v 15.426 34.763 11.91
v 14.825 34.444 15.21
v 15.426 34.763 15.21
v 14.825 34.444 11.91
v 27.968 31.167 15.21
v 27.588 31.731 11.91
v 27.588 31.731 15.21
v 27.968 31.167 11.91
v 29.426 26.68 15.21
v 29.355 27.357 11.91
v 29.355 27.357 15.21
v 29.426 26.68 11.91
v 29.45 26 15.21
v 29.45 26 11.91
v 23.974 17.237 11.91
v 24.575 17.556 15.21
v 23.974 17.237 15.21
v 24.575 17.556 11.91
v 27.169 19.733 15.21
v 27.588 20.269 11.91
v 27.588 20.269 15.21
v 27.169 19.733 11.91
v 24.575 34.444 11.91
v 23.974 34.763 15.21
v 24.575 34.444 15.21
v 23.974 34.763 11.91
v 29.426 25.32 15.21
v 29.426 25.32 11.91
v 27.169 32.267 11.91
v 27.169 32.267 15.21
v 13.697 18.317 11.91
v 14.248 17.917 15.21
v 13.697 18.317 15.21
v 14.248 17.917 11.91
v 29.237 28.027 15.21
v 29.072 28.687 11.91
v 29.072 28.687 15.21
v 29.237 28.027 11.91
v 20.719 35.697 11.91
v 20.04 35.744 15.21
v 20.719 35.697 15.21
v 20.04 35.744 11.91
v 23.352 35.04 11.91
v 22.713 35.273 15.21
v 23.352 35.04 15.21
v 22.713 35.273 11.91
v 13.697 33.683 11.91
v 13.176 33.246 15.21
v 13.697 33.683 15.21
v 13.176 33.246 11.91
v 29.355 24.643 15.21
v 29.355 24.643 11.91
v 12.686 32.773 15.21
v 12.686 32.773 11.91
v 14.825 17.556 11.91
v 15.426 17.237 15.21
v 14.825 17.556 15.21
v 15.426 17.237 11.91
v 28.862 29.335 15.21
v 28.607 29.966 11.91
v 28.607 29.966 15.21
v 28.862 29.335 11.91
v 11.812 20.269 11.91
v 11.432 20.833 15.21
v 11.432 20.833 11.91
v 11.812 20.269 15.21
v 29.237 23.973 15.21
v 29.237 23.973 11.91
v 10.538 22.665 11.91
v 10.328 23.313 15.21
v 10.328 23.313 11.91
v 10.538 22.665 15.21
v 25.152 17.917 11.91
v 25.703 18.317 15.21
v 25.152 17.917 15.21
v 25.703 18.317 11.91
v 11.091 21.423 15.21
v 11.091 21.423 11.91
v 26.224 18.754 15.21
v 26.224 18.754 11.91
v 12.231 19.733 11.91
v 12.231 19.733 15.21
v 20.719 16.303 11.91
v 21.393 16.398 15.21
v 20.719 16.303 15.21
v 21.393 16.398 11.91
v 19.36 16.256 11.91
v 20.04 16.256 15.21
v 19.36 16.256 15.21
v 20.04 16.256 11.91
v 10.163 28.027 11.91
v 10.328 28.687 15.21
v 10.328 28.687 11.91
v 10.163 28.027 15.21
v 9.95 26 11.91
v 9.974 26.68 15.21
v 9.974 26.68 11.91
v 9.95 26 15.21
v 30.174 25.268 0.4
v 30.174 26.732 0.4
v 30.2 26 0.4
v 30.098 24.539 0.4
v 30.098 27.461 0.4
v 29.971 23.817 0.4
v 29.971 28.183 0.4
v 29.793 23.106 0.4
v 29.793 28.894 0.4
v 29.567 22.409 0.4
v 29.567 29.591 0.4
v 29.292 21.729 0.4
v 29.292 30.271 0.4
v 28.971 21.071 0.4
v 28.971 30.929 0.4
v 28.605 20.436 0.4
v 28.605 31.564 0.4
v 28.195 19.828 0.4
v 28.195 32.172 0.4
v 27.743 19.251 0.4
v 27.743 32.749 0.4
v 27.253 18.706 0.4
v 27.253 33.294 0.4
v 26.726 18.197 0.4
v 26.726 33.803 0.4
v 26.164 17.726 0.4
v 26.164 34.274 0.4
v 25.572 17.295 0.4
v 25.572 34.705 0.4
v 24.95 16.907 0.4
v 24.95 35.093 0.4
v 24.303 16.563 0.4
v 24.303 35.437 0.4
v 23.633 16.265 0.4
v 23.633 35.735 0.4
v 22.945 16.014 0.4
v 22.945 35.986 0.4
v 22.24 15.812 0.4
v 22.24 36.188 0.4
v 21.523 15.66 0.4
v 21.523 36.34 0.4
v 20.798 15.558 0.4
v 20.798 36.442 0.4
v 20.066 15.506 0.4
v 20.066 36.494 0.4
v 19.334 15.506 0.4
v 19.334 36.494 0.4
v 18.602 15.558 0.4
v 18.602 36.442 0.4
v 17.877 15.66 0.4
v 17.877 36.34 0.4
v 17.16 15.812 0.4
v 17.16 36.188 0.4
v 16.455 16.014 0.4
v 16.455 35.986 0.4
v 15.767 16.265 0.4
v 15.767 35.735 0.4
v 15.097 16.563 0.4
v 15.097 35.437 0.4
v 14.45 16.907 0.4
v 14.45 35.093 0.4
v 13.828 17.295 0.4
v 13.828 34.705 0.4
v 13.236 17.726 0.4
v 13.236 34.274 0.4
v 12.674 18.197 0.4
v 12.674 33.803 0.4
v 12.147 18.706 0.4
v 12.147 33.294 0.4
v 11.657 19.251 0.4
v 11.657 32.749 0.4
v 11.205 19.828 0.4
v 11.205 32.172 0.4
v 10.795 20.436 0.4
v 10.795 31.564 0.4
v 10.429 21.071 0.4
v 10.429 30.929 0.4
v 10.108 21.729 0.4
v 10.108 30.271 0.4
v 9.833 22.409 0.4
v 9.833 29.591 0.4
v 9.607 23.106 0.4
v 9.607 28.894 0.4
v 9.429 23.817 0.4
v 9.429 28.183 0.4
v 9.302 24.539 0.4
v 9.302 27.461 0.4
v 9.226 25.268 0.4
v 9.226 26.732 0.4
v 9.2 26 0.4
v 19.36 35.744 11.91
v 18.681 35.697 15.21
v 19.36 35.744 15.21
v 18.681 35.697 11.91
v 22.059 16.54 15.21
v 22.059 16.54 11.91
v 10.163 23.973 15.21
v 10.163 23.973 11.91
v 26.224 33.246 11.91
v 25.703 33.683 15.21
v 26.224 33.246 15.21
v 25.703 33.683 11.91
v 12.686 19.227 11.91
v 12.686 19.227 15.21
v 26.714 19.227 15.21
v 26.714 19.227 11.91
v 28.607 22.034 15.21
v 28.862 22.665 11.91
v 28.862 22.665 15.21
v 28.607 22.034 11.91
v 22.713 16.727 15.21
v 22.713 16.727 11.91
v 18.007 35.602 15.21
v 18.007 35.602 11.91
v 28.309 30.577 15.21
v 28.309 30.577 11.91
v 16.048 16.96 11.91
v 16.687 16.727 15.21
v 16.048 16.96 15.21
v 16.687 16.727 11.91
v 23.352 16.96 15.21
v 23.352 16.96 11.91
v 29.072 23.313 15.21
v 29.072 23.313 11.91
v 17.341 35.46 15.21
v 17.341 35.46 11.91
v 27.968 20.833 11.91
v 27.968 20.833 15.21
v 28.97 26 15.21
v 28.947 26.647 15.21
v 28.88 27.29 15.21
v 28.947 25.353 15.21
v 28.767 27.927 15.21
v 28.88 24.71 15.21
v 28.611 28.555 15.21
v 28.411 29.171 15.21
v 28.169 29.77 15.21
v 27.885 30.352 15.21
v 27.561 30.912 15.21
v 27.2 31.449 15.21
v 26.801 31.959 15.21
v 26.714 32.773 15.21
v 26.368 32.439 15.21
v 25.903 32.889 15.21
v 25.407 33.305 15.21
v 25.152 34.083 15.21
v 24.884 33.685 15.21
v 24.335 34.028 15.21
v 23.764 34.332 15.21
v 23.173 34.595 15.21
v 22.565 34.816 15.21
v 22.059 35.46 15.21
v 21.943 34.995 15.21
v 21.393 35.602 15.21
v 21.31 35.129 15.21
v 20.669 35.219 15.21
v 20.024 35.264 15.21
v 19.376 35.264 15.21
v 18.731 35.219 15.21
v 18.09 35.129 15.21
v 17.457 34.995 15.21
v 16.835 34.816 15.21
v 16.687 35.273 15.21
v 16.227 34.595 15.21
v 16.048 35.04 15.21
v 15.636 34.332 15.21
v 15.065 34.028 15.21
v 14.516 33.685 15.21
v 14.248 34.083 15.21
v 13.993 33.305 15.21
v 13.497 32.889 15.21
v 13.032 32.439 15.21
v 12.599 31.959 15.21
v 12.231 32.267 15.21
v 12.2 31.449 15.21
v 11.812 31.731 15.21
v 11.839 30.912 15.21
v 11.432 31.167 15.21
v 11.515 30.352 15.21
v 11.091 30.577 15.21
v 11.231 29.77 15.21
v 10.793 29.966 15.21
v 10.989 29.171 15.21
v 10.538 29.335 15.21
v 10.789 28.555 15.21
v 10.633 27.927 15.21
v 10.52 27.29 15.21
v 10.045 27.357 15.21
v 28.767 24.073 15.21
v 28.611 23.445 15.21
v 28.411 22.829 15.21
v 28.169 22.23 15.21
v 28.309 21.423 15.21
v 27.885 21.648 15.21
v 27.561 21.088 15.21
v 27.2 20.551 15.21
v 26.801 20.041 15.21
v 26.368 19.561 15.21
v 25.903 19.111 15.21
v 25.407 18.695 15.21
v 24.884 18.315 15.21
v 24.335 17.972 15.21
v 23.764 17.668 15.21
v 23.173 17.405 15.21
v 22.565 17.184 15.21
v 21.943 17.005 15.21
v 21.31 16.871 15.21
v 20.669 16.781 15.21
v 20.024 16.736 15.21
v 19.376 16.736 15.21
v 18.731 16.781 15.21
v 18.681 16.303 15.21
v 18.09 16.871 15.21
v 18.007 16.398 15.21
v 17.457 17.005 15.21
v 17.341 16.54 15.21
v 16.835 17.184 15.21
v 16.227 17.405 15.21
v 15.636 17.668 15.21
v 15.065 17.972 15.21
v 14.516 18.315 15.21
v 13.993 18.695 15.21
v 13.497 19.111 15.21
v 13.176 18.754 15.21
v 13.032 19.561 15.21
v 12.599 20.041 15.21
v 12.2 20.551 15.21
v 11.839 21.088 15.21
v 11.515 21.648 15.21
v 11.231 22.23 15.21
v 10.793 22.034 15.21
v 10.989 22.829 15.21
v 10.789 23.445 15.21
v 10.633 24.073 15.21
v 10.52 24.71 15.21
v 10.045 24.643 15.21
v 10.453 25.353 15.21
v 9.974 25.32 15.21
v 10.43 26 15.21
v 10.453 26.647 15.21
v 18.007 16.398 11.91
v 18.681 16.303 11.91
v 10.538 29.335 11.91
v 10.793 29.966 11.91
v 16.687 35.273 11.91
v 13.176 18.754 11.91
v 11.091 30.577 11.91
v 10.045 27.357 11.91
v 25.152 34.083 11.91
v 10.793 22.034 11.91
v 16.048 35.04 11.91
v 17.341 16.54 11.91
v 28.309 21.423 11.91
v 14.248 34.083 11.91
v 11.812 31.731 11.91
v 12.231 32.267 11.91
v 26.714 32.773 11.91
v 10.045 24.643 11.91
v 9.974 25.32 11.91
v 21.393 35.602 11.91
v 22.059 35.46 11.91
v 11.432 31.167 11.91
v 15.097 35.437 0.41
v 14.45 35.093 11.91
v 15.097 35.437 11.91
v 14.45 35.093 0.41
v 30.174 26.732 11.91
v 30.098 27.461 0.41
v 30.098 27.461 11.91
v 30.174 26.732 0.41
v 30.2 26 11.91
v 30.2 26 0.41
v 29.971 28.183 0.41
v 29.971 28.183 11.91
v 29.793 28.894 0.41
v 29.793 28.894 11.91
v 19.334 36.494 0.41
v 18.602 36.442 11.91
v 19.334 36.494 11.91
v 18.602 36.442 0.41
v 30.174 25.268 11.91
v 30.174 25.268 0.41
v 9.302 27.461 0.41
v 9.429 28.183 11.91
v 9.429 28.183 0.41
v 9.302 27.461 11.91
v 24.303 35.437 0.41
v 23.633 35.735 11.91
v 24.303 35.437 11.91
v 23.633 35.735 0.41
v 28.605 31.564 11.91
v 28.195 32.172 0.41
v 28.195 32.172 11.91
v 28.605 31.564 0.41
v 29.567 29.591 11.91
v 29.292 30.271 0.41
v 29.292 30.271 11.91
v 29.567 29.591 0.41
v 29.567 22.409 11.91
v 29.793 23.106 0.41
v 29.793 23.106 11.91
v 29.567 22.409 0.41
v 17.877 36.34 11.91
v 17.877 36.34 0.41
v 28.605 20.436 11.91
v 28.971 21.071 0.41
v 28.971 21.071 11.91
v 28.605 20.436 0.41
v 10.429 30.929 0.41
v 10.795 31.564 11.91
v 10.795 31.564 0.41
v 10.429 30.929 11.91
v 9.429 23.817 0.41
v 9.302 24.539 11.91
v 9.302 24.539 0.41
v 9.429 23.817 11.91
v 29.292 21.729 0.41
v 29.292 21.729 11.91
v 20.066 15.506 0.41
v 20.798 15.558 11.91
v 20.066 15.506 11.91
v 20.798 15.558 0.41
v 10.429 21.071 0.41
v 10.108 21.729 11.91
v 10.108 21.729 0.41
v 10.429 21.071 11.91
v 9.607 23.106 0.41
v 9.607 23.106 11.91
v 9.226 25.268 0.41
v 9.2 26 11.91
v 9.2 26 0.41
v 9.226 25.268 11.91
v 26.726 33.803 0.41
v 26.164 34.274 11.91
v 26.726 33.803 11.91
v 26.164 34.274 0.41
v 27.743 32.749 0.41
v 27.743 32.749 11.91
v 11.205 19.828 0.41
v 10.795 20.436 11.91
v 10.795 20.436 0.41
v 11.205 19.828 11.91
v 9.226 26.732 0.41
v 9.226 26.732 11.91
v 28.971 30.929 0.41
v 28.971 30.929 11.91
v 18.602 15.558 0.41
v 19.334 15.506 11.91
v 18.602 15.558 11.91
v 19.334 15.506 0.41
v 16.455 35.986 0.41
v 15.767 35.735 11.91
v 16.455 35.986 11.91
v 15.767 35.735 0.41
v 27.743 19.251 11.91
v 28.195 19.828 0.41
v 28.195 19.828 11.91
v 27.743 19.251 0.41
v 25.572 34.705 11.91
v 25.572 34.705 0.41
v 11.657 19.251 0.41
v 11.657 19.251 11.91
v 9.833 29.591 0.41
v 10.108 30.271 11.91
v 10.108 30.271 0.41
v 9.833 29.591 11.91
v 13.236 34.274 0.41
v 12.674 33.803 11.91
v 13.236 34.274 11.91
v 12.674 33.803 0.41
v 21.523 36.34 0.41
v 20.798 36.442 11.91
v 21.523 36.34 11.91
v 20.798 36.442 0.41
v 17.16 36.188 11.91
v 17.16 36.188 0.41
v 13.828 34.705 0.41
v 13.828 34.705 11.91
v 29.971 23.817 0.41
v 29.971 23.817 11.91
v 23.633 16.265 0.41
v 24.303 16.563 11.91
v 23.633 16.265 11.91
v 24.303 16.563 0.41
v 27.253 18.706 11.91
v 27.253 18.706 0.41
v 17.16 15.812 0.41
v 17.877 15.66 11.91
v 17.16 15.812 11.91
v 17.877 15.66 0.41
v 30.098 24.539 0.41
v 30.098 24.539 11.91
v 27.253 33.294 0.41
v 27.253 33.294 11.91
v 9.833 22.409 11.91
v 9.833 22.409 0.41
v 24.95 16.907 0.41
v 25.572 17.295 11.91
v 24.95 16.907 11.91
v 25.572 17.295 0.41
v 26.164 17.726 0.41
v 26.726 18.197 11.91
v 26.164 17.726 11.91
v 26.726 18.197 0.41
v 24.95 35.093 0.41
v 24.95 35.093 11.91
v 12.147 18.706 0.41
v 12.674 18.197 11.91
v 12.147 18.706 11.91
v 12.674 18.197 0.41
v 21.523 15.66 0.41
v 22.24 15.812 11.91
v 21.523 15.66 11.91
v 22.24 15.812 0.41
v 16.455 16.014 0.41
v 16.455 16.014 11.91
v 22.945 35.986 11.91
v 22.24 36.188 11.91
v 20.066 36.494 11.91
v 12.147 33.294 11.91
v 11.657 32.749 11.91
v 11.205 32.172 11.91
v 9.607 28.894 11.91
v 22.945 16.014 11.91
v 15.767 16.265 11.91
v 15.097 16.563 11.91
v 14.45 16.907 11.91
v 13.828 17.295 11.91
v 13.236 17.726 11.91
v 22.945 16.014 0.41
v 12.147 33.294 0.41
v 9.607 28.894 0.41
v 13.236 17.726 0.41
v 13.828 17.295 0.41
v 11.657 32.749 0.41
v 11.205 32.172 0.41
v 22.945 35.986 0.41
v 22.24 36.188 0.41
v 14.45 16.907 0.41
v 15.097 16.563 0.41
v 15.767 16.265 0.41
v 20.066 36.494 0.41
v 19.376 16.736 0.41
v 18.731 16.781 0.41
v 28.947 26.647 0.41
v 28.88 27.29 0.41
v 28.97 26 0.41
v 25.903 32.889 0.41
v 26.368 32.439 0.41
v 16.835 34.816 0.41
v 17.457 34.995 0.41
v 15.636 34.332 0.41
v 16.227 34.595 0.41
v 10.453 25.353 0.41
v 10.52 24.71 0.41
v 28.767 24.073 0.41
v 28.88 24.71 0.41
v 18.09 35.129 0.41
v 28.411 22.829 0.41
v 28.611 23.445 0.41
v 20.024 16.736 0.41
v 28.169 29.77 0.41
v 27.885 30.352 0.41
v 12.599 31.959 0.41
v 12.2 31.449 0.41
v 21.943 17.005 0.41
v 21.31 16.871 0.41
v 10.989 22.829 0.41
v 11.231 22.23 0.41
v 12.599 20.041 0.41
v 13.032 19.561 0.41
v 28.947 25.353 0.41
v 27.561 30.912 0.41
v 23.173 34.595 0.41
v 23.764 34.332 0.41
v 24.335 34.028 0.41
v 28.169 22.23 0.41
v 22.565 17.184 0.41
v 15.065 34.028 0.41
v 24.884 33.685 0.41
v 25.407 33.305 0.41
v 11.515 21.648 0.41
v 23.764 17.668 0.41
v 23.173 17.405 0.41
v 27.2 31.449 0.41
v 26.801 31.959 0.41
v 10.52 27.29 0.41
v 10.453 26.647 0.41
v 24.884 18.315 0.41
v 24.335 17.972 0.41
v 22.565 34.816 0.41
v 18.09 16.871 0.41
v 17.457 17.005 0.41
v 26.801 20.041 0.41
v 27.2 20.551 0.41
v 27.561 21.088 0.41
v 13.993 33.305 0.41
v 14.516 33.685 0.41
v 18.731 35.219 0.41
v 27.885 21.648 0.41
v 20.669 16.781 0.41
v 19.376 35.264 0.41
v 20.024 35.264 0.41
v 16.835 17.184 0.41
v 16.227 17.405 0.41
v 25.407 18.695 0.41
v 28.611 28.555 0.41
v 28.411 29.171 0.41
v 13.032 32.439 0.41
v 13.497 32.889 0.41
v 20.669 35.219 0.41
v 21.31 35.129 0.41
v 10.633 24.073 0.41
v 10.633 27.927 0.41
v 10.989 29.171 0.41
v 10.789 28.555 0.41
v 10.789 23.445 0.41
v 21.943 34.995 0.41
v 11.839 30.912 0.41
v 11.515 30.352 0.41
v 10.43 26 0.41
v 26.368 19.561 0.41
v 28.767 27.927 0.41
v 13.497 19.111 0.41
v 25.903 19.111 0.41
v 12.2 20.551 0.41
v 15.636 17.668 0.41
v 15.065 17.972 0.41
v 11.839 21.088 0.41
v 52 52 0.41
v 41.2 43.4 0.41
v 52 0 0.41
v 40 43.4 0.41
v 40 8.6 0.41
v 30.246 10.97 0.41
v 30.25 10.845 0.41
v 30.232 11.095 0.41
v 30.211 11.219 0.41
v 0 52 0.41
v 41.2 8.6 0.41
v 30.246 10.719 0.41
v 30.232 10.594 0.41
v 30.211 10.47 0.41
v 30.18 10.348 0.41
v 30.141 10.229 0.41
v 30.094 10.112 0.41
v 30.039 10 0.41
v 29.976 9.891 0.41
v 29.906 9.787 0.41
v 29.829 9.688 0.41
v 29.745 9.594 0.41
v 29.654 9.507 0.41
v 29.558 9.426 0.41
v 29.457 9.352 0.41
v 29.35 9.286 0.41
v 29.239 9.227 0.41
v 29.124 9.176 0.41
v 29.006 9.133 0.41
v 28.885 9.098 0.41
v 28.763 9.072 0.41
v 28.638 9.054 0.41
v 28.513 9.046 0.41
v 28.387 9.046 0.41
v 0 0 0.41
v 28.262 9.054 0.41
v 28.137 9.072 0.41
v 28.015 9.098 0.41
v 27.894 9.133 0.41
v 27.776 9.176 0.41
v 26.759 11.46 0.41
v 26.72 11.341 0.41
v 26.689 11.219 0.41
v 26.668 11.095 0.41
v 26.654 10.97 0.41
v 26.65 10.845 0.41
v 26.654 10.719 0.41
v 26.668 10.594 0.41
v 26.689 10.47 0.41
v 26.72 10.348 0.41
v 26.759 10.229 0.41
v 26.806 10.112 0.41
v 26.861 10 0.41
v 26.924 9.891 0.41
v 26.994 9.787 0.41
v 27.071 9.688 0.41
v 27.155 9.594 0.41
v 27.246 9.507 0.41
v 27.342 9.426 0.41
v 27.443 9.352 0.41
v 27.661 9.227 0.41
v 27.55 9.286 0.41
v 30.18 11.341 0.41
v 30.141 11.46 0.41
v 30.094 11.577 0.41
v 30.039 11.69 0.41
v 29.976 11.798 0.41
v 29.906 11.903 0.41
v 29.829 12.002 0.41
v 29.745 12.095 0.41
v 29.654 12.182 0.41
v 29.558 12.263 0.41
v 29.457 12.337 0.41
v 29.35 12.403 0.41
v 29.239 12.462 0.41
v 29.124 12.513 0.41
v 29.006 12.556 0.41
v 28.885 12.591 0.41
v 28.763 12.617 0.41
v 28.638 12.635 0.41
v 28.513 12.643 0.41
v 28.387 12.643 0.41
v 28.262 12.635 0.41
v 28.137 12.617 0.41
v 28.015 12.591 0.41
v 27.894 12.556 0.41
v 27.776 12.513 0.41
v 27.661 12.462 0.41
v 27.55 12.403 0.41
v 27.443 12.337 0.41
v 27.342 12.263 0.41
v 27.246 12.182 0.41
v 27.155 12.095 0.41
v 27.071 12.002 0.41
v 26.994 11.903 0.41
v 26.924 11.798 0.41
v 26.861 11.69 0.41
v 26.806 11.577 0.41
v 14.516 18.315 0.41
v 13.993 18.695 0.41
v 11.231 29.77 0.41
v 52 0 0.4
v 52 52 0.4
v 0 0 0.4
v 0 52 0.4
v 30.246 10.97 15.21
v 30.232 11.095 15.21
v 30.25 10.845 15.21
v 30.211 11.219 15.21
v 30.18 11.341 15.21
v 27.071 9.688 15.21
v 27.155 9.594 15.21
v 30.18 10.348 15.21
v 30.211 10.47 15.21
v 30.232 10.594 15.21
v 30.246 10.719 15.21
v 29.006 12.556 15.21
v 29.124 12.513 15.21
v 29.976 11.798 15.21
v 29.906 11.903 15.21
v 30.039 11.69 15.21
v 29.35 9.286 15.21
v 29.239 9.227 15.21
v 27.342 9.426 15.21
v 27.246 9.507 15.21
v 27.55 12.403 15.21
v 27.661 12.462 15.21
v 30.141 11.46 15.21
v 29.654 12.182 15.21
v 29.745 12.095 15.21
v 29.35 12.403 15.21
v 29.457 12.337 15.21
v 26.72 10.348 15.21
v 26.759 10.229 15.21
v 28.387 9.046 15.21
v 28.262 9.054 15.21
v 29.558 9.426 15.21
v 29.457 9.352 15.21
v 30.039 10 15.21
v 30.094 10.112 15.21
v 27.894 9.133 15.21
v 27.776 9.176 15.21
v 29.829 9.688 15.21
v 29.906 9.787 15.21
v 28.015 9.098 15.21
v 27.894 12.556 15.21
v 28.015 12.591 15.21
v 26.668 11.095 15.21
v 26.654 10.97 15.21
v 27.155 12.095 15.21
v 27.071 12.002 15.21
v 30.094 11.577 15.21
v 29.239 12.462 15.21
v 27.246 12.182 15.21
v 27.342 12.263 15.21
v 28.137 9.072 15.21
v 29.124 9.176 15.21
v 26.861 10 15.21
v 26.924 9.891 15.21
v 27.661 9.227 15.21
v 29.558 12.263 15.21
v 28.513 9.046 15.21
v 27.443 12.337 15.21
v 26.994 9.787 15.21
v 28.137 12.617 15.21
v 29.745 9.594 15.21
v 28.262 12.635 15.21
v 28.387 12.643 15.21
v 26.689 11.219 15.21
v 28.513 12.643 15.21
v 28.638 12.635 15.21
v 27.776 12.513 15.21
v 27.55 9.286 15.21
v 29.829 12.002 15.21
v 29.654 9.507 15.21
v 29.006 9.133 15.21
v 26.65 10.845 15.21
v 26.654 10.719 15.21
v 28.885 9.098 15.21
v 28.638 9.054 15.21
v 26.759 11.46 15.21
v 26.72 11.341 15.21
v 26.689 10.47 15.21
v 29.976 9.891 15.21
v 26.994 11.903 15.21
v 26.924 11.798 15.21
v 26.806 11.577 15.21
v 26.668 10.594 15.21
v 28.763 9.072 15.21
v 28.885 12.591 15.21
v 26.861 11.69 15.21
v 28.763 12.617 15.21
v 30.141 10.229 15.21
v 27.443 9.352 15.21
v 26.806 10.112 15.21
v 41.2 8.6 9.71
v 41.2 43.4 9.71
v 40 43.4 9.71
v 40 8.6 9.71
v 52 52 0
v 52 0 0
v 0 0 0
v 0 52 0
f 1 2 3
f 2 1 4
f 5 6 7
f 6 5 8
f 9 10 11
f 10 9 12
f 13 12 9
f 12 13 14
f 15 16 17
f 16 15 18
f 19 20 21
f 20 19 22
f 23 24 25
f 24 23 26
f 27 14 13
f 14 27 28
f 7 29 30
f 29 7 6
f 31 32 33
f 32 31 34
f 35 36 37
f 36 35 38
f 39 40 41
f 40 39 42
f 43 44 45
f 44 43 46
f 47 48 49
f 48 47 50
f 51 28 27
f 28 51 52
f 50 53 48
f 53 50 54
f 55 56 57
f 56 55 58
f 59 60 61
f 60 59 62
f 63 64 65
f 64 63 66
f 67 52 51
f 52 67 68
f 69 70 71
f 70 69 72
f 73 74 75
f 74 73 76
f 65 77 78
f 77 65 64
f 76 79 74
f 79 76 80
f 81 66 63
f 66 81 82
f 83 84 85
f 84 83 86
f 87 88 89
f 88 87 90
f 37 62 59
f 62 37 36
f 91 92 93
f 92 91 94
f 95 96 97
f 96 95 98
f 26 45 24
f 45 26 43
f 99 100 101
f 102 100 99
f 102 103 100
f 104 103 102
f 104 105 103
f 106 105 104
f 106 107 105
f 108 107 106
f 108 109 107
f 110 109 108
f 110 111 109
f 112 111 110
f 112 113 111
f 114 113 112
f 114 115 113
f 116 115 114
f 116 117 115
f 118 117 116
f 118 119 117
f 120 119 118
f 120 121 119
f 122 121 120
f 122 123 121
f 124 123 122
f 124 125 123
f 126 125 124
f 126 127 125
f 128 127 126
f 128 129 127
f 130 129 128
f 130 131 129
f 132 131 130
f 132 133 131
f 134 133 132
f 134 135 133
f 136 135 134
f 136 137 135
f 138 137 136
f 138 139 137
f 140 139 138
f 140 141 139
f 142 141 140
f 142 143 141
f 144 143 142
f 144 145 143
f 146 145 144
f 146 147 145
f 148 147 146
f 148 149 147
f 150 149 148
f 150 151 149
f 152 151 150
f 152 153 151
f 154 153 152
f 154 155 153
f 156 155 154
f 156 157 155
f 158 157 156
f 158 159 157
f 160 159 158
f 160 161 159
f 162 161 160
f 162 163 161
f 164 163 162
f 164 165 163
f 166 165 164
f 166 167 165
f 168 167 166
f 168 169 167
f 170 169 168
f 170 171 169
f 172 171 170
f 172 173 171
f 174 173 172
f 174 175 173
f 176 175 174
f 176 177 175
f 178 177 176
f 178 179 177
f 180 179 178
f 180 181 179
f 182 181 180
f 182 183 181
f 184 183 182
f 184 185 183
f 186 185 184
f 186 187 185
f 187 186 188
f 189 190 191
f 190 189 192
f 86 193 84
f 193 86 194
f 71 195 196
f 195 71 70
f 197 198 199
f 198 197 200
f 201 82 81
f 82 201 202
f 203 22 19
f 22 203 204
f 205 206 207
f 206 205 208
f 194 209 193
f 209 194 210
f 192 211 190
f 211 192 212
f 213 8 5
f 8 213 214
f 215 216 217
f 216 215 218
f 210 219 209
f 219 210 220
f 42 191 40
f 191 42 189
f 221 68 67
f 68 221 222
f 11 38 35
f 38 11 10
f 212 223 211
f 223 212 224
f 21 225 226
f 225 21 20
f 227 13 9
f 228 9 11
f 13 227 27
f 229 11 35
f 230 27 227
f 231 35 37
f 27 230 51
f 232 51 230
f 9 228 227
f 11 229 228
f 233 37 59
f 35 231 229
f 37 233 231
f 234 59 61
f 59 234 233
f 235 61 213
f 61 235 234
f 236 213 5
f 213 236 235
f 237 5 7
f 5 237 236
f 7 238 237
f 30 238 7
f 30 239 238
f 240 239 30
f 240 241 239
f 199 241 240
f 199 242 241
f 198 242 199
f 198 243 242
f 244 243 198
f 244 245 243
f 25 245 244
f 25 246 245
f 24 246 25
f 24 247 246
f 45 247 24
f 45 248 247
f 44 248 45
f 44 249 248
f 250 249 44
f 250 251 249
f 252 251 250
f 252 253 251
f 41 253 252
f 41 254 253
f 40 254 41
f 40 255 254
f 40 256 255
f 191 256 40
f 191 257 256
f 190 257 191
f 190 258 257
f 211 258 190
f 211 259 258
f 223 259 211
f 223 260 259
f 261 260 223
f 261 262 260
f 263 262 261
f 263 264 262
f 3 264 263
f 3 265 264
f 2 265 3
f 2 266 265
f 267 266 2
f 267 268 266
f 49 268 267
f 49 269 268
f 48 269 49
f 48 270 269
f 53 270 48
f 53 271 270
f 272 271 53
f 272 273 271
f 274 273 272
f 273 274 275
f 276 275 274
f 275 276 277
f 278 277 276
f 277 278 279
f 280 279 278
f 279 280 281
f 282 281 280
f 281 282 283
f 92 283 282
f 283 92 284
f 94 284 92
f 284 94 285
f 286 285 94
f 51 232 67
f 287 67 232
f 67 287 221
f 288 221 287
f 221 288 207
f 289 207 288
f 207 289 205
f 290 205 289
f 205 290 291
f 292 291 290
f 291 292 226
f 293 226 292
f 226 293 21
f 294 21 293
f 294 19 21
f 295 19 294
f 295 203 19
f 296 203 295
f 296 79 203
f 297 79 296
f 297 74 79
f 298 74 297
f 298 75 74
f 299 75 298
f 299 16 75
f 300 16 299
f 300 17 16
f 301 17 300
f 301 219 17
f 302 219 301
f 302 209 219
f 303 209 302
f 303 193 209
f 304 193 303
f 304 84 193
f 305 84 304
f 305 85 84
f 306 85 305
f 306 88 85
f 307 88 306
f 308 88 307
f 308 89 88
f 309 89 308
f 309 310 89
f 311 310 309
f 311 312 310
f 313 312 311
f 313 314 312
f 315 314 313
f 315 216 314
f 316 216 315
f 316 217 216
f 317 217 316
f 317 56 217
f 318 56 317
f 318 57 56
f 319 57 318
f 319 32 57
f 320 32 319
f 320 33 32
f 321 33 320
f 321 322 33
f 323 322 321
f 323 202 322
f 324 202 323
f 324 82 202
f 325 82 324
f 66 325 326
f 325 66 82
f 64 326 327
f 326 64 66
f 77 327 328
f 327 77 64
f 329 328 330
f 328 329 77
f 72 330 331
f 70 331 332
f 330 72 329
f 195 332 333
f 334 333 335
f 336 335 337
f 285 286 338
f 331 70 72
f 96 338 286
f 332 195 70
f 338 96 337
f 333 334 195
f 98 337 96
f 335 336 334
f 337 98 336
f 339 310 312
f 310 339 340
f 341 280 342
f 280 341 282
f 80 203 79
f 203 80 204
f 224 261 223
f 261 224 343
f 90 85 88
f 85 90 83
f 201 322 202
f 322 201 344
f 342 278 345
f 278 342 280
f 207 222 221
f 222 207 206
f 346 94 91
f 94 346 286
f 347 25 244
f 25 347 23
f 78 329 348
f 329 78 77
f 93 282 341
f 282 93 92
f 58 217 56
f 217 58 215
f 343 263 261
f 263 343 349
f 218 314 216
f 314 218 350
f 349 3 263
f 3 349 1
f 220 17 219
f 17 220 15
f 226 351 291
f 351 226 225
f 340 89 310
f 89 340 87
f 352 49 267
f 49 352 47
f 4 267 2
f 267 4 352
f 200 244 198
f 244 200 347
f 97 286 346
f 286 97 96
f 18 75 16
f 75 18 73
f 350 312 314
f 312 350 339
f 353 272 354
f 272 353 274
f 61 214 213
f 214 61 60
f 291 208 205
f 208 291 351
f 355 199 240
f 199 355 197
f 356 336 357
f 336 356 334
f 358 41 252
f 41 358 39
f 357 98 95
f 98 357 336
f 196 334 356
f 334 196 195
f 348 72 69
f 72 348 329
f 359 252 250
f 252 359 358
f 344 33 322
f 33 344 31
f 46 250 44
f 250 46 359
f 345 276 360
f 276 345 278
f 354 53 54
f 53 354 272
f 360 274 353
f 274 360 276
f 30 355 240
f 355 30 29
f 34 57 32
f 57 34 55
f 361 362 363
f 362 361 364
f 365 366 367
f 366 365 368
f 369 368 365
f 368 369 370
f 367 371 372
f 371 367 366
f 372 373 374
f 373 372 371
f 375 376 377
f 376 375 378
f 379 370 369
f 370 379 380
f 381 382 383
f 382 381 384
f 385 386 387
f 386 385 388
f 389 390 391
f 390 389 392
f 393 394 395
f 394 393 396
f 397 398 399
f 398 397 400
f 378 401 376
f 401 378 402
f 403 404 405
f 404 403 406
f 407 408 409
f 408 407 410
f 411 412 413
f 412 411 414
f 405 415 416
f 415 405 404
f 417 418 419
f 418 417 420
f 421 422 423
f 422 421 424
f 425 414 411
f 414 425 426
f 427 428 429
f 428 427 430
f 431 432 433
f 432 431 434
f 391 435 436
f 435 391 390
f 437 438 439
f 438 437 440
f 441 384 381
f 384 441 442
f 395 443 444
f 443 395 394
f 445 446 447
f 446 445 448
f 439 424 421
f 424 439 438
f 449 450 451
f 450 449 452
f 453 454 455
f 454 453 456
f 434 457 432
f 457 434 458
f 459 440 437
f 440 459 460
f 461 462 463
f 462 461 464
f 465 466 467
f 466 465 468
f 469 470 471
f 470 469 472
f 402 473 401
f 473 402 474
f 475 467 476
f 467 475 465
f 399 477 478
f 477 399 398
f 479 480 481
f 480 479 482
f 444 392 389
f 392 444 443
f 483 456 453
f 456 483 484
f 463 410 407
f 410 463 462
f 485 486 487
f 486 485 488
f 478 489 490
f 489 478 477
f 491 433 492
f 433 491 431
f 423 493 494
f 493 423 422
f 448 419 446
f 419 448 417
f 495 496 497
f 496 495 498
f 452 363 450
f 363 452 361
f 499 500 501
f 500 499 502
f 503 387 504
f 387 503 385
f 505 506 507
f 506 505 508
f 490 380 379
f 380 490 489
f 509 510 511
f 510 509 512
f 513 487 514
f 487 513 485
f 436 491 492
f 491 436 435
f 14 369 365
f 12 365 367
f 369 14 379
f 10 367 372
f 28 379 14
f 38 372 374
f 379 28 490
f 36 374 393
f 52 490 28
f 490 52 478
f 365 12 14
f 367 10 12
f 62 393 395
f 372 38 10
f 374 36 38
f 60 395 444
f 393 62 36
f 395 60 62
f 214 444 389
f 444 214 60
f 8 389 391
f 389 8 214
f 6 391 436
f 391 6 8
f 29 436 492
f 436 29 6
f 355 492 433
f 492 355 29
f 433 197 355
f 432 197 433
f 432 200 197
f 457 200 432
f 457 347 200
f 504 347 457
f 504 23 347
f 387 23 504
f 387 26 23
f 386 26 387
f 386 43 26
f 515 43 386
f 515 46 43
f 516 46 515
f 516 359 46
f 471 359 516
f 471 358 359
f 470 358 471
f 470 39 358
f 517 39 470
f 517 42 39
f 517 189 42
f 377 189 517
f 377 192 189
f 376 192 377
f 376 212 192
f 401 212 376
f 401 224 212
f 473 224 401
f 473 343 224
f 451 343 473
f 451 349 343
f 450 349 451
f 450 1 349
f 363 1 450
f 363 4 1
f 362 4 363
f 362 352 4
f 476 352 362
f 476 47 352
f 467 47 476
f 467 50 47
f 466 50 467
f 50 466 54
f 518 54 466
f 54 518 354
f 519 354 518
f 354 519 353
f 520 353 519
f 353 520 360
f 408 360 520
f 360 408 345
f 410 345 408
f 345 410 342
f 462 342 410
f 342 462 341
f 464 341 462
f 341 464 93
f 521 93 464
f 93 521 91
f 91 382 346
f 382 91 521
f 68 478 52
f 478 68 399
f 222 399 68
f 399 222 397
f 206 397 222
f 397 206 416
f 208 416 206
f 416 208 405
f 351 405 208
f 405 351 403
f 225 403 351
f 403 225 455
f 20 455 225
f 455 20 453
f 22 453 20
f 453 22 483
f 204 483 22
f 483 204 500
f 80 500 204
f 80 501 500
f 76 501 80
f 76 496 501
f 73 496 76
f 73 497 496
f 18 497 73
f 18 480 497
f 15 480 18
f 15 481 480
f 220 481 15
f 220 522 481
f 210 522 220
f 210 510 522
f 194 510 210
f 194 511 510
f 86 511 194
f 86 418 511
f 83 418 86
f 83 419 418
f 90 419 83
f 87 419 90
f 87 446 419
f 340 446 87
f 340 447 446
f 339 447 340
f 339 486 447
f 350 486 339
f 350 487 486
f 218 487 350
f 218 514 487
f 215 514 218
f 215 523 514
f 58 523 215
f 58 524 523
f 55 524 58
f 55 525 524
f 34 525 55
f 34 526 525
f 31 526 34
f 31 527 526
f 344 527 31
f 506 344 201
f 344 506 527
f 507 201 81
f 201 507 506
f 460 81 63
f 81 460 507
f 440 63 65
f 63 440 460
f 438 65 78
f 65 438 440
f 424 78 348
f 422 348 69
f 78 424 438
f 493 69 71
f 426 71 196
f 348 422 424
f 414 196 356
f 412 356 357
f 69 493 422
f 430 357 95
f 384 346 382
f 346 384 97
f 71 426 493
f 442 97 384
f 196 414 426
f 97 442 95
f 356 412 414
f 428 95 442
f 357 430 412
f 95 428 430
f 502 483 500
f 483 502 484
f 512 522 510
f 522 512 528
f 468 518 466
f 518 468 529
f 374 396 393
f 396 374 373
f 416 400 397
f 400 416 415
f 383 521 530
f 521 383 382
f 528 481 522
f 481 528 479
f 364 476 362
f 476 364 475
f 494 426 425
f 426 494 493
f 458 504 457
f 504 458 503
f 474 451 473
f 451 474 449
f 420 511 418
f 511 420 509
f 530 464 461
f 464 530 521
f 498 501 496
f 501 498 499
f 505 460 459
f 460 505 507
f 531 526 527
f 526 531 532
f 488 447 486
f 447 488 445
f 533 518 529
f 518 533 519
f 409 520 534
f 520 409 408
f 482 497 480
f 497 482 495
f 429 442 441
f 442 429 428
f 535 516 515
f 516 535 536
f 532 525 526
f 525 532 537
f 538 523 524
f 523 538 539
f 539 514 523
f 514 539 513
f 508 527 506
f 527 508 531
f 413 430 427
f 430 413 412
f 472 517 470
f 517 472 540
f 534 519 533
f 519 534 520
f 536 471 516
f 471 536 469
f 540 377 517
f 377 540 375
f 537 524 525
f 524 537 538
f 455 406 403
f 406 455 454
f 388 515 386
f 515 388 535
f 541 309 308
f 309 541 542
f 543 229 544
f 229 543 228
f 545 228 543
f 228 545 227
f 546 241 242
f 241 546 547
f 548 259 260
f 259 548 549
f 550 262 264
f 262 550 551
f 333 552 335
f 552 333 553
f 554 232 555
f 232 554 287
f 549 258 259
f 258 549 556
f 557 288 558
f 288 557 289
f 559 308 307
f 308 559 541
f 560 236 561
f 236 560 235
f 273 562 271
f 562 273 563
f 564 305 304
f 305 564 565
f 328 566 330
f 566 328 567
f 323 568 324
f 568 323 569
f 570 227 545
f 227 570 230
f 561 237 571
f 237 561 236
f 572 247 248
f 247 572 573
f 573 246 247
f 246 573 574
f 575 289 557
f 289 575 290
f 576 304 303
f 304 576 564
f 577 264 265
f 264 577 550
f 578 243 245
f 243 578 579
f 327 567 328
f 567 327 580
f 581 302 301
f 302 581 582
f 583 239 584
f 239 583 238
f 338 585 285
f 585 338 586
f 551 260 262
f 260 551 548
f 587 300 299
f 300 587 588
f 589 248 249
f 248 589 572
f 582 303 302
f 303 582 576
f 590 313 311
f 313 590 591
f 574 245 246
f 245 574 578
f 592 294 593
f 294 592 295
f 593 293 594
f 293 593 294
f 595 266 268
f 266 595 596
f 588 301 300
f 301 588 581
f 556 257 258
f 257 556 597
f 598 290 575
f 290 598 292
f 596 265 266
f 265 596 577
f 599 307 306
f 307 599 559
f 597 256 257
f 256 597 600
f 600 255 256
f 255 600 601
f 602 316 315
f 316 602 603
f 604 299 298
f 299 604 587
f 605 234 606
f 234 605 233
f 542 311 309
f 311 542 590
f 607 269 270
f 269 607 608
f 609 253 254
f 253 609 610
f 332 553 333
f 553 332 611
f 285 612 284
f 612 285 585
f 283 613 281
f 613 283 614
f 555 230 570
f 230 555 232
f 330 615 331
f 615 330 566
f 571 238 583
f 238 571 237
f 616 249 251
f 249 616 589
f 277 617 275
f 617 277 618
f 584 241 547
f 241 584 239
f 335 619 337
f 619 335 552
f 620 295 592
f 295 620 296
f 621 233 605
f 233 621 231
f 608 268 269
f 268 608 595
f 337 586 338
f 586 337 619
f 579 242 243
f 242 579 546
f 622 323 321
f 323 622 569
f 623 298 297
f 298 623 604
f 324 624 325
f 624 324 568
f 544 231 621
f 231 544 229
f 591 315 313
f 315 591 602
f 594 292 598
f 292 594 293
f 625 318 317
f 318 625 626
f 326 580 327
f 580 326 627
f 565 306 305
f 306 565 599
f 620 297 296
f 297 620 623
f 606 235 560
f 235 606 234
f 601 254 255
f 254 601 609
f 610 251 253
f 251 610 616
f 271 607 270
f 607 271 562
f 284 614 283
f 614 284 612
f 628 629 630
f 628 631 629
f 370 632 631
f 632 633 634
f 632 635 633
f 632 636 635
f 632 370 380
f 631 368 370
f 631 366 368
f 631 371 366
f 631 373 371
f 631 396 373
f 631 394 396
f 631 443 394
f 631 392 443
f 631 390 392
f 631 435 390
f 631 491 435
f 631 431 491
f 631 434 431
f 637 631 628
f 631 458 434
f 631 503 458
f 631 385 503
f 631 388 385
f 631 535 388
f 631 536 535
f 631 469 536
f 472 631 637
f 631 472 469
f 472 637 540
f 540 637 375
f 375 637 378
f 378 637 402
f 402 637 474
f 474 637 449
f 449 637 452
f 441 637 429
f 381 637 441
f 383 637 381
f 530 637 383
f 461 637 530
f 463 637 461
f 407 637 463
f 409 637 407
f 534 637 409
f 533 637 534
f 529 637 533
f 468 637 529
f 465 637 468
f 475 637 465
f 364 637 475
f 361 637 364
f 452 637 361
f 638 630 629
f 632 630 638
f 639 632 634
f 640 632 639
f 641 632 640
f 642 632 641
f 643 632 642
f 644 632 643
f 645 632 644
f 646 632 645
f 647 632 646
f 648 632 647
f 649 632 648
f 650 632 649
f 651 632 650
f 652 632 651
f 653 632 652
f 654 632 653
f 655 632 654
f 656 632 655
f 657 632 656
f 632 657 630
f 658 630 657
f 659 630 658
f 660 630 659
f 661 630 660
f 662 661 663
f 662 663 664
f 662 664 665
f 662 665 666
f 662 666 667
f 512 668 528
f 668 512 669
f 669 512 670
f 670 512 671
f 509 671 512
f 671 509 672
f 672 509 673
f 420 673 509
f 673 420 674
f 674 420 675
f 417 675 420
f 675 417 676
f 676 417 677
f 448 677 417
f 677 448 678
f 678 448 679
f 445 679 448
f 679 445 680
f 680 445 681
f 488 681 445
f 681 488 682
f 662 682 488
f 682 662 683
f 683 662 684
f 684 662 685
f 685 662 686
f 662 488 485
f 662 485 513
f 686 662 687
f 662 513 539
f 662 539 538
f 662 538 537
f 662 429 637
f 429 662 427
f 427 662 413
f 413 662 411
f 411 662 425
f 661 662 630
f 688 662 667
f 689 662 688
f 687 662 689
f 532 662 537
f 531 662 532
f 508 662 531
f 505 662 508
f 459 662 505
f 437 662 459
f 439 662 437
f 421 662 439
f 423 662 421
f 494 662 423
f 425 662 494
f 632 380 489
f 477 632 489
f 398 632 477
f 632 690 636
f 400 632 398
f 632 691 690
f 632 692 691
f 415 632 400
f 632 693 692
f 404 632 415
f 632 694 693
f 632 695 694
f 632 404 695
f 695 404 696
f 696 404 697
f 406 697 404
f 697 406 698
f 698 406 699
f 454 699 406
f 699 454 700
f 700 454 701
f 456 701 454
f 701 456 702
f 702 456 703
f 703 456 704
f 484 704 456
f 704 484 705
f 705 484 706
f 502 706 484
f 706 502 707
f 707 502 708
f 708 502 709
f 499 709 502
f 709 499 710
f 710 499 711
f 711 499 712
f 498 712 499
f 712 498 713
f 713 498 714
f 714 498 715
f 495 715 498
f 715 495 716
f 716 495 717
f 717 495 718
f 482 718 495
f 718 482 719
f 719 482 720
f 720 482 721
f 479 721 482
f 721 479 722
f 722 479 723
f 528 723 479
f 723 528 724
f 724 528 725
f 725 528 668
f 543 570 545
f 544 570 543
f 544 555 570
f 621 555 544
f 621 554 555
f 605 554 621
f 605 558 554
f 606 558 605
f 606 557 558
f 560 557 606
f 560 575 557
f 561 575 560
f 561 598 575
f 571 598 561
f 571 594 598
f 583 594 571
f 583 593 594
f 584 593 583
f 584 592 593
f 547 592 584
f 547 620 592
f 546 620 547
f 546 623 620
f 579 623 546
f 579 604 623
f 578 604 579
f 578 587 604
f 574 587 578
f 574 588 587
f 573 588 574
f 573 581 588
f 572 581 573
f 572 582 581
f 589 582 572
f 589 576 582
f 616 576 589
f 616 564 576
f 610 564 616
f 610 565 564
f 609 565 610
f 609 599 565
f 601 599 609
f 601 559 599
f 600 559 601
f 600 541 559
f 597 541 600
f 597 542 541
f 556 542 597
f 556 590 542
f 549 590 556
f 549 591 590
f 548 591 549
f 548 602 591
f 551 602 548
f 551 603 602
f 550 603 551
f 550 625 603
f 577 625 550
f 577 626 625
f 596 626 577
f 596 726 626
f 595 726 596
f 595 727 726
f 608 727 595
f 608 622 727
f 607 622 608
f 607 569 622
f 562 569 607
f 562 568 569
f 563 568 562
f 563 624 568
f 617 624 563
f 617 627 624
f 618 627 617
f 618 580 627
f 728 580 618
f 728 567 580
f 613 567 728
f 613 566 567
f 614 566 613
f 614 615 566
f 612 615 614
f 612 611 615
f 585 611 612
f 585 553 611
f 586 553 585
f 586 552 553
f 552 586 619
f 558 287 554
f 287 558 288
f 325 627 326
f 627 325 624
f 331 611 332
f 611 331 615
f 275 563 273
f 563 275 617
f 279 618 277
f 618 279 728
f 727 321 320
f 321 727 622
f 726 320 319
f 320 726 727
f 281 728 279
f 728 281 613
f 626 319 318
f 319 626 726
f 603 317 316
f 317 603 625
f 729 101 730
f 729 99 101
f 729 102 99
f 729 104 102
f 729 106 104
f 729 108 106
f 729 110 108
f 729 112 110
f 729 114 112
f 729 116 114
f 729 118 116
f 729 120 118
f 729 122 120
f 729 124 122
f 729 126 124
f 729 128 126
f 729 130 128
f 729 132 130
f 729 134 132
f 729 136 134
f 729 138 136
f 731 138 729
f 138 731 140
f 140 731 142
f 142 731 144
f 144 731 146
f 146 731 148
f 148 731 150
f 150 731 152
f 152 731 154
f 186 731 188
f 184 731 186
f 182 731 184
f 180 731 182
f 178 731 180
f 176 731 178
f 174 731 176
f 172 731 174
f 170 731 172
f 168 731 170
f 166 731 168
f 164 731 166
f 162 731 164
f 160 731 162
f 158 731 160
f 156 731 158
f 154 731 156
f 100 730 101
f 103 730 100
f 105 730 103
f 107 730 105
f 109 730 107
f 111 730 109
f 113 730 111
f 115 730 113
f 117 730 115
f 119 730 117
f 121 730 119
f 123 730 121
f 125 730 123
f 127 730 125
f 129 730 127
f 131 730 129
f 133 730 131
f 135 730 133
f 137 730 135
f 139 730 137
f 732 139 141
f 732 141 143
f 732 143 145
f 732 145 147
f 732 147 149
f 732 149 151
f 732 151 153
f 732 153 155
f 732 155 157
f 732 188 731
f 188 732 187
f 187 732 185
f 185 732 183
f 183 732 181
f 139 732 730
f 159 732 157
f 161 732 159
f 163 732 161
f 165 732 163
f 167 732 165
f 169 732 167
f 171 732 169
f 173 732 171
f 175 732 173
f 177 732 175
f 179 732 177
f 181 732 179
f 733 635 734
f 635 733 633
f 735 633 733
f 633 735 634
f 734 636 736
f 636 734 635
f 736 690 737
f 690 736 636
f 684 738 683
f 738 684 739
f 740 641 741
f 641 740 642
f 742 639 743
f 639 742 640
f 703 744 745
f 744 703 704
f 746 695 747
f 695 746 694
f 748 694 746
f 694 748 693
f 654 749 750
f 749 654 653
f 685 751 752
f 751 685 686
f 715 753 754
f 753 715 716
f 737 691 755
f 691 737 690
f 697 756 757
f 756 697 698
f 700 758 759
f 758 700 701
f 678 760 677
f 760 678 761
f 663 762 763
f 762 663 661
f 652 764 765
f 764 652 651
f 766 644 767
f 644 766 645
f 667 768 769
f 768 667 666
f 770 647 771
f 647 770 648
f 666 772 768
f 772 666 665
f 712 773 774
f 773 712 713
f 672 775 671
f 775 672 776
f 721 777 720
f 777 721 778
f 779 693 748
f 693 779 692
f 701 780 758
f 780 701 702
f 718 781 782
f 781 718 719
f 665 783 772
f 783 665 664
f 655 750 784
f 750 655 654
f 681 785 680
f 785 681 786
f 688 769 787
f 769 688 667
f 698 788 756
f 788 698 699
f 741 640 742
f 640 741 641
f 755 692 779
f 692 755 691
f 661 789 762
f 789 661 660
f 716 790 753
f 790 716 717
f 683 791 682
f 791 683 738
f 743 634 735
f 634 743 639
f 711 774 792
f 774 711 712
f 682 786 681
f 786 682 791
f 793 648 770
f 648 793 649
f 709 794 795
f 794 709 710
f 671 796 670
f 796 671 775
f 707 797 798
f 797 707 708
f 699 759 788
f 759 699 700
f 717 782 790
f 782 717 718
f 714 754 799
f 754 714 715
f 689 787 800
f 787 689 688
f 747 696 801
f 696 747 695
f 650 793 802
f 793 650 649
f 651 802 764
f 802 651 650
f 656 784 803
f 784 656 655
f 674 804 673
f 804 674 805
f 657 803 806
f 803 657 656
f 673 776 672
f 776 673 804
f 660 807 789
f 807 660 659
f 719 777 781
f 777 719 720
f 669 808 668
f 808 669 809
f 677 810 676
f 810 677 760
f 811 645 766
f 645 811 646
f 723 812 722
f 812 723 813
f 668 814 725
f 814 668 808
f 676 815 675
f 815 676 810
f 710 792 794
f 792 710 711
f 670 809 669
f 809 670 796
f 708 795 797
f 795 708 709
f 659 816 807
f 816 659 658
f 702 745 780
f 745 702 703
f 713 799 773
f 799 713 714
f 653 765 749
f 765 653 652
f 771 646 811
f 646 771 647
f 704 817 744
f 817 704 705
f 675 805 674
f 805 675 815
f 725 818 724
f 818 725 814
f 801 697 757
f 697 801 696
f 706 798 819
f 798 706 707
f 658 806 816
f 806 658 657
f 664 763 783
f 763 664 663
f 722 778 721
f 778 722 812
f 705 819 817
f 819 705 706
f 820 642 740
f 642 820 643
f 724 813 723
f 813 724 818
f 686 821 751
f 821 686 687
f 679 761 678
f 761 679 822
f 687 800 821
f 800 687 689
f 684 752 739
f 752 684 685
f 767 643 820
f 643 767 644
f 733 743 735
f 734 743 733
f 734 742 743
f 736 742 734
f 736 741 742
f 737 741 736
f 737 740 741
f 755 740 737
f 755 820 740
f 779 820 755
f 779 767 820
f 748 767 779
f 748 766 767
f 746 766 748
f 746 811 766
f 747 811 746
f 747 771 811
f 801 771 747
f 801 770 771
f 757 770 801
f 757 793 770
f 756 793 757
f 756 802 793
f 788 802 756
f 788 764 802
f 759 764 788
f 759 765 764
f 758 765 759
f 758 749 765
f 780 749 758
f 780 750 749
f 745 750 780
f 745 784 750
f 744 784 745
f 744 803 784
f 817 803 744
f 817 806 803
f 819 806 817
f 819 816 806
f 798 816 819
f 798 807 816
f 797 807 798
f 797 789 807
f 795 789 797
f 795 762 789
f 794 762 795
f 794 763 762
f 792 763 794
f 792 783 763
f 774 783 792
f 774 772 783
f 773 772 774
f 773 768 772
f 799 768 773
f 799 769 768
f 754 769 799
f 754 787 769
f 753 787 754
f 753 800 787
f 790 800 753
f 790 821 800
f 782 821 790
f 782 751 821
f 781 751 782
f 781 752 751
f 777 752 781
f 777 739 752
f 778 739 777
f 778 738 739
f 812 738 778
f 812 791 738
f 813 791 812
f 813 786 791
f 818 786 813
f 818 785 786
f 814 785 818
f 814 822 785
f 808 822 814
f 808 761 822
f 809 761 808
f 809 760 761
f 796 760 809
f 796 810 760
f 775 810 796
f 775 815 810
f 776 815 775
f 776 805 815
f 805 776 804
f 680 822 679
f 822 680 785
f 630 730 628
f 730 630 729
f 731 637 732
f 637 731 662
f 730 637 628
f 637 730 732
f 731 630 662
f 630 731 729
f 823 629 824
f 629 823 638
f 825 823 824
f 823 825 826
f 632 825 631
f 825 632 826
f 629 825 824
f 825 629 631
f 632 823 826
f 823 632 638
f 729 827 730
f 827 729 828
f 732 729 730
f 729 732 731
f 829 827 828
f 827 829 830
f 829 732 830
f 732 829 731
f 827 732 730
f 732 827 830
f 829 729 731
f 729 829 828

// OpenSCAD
// file: ../../Base/PlacementOptions.scad
// Fischertechnik Box Foundation
// Placement Options

// Alignment
NoAlign = 0;
AlignLeft = 1;
AlignBottom = 2;
AlignCenter = 3;
AlignRight = 4;
AlignTop = 5;

// Element rotation degree steps
rotations = [0, -90, -180, -270];

// Rotation
NoRotation = 0;
Rotate0 = 0;
Rotate90 = 1;
Rotate180 = 2;
Rotate270 = 3;

// Docking (seen from above)
NoDock = -1;
DockLeft = 0;
DockTop = 1;
DockRight = 2;
DockCorner = 2;
DockBottom = 3;

// Web corners
LowerLeft = 0;
UpperLeft = 1;
UpperRight = 2;
LowerRight = 3;

// Web position relative to corner
LeftOfCorner = 0;
RightOfCorner = 1;
// file: ../../Base/Boxes.scad
// Fischertechnik Box Foundation
// Pre-designed Boxes

use <Constants.scad>

include <PlacementOptions.scad>

box190Width = 190;
box190Depth = 130;
box130Width = 130;
box130Depth = 95;
boxUsageHeight = 33.9;
boxWallThickness = 2.4;
boxBaseThickness = 1.0;
boxWebWidth = 3.0;

// getBoxWallThickness()
// Gets the wall thickness of a Fischertechnik Box

function getBoxWallThickness() = boxWallThickness;

// Gets the usable height of a fischertechnik box
function getBoxUsageHeight() = boxUsageHeight;

// Gets the thickness of the Fischertechnik box base.
function getBoxBaseThickness() = boxBaseThickness;

// Gets the width of a box web
function getBoxWebWidth() = boxWebWidth;

// Gets the usable inner space of a Box 190 as an x/y-list
function getBox190Space() = [
    box190Width - 2*getBoxWallThickness(), 
    box190Depth - 2*getBoxWallThickness() ];

// Imports the Fischertechnik empty box 130x190 mm and places it at position 0,0
// 190x130 are the outer sizes, the inner space is slightly smaller. Use getBox190Space() to get the inner sizes.
// This module needs the STL file "Fischertechnik Box 130x190.stl" in the library path.
// The box is positioned that the usable inner space is at the 0,0,0 position. The

module Box190() {
    translate([-getBoxWallThickness(),-getBoxWallThickness(),-getBoxBaseThickness()])
        import("Fischertechnik Box 130x190.stl", convexity=3);
}

// Gets the usable inner space of a Box 130 as an x/y-list
function getBox130Space() = [
    box130Width - 2*getBoxWallThickness(), 
    box130Depth - 2*getBoxWallThickness() ];

// Imports the Fischertechnik empty box 95x130 mm and places it at position 0,0
// 190x130 are the outer sizes, the inner space is slightly smaller. Use getBox190Space() to get the inner sizes.
// This module needs the STL file "Fischertechnik Box 95x130.stl" in the library path.
// The box is positioned that the usable inner space is at the 0,0,0 position. The

module Box130() {
    translate([-getBoxWallThickness(),-getBoxWallThickness(),-getBoxBaseThickness()])
        import("Fischertechnik Box 95x130.stl", convexity=3);
}

// Creates a web at the specified box walls
// corner 0 = LowerLeft, 1 = UpperLeft, 2 = UpperRight, 3 = LowerRight
// side 0 = LeftOfCorner, 1 = RightOfCorner
// distance = Distance in mm from the corner
// box = inner width and depth of the box (default: Box 190)
// webWidth = length of the web (default is 3 mms)
// webThickness = thickness of the web (default is 1 mm)

module BoxWeb(corner, side, distance, box=getBox190Space(), webWidth=getBoxWebWidth(), webThickness=1.0) {
    sink = getBoxWallThickness()/2;

    width = (corner % 2 == 0) ? 
            (side == LeftOfCorner ? webWidth : webThickness) :
            (side == LeftOfCorner ? webThickness : webWidth);

    depth = (corner % 2 == 0) ? 
            (side == RightOfCorner ? webWidth : webThickness) :
            (side == RightOfCorner ? webThickness : webWidth);
    
    xDiff = corner == LowerLeft ? 
                (side == LeftOfCorner ? -sink : distance) :
            (corner == UpperLeft ?                
                (side == LeftOfCorner ? distance : -sink) :
            (corner == UpperRight ?
                (side == LeftOfCorner ? box.x-webWidth+sink : box.x-distance-webThickness) :
                (side == LeftOfCorner ? box.x-distance-webThickness: box.x-webWidth+sink)));

    yDiff = corner == LowerLeft ? 
                (side == RightOfCorner ? -sink : distance) :
            (corner == UpperLeft ?
                (side == RightOfCorner ? box.y-distance : box.y-webWidth+sink) :
            (corner == UpperRight ?
                (side == RightOfCorner ? box.y-webWidth+sink : box.y-distance) :
                (side == RightOfCorner ? distance : -sink)));
    
    translate([xDiff, yDiff, -getExcess()])
        cube([width, depth, boxUsageHeight + 2*getExcess()]);
}
// file: ../../Base/Rotation.scad
// Fischertechnik Box Foundation
// Geometry Helpers Rotation

include <PlacementOptions.scad>

// getRotatedSpace(space, rotation=NoRotation)
// Rotates the space dependent on the specified rotation

function getRotatedSpace(space, rotation=NoRotation) = [
    (rotation == Rotate90 || rotation == Rotate270) ? space.y : space.x,
    (rotation == Rotate90 || rotation == Rotate270) ? space.x : space.y
];

// Rotates the given space around the fixed left lower corner
// space = the space the children needs as width/depth list [width,depth]
// rotation = 0 Rotate0 degrees, 1 Rotate90 degrees, 2 Rotate180 degrees, 3 Rotate270 degrees (equivalent to -90)

module RotateFix(space, rotation=NoRotation) {
    dy = (rotation == Rotate0 || rotation == Rotate270) ? 0 :
        (rotation == Rotate90) ? space.x :
        space.y;
    dx = (rotation < Rotate180) ? 0 :
        (rotation == Rotate180) ? space.x :
        space.y;
    
    translate([dx, dy, 0])
        rotate([0, 0, rotations[rotation]])
            children();
}
// file: ../../Base/Alignment.scad
// Fischertechnik Box Foundation
// Geometry Helpers Alignment

include <PlacementOptions.scad>

// getAlignedX(elementWidth, spaceWidth, align=AlignRight, offset=0)
// Gets the aligned X offset of an element with the given
// width in the given space.
// elementWidth = The width of the element to positon
// spaceWidth = The space where the element should be aligned
// align = 0 AlignLeft, 1 AlignCenter, 2 AlignRight
// offset = an optional offset from the aligned position. When
// aligned left or centered, then positive values are in X direction.
// When aligned right then positive values are in negative X direction.

function getAlignedX(elementWidth, spaceWidth, align=AlignRight, offset=0) =
    (align == AlignLeft) ?
        offset :
        ((align == AlignCenter) ?
        (spaceWidth - elementWidth)/2 + offset :
        spaceWidth - offset - elementWidth);

// getAlignedY(elementDepth, spaceDepth, align=AlignTop, offset=0)
// Gets the aligned Y offset of an element with the given
// depth in the given space.
// elementDepth = The depth of the element to positon
// spaceDepth = The space where the element should be aligned
// align = 0 AlignBottom, 1 AlignCenter, 2 AlignTop
// offset = an optional offset from the aligned position. When
// aligned bottom or centered, then positive values are in Y direction.
// When aligned top then positive values are in negative Y direction.

function getAlignedY(elementDepth, spaceDepth, align=AlignTop, offset=0) =
    (align == AlignBottom) ?
        offset :
        ((align == AlignCenter) ?
        (spaceDepth - elementDepth)/2 + offset :
        spaceDepth - offset - elementDepth);
// file: ../../Elements/CylinderGearZ20.scad
// Fischertechnik Box Library
// Cylinder for Gear Z20
// 31021

use <../Base/Constants.scad>
use <../Base/Placement.scad>
use <../ModelBase/Simple.scad>

depth = 33.8;
width = 33.8;
height = 14.8;
levelHeight = 11.5;

function getCylinderGearZ20Height() = height;
function getCylinderGearZ20LevelHeight() = levelHeight;

// getCylinderGearZ20Space()
// Gets the space the cylinder gear needs as width and depth (.x and .y as a list)

function getCylinderGearZ20Space() = [width, depth];

// CylinderGear()
// Standing cylinder for gear wheel Z20

module CylinderGearZ20() {
    diameter = getHubRingDiameter();
    levelDiameter = getHubRingLevelDiameter();

    Space(getCylinderGearZ20Space());
        
    Center(getCylinderGearZ20Space())
        LeveledTube(getCylinderGearZ20Height(), diameter, getCylinderGearZ20LevelHeight(), levelDiameter);
}

// Tests
color("lightgray")
CylinderGearZ20();
// file: ../../Base/Placement.scad
// Fischertechnik Box Foundation
// Geometry Helpers Placement

use <Constants.scad>
use <Alignment.scad>
use <Rotation.scad>
use <Boxes.scad>

include <PlacementOptions.scad>

// Place(x=0, y=0, elementSpace=[0,0], alignX=AlignLeft, alignY=AlignBottom, rotation=Rotate0, boxSpace=getBox190Space())
// Places the child at the specified position
// y = Y-Position. This is a relative position when an X aligment is specified.
// x = X-Position. This is a relative position when an Y aligment is specified.
// elementSpace = space of the element to be placed [x,y]
// alignX = -1=NoAlign, 0 AlignLeft, 1 AlignCenter, 3 AlignRight (elementSpace and boxSpace required!)
// alignY = -1=NoAlign, 2 AlignBottom, 1 AlignCenter, 4 AlignTop (elementSpace and boxSpace required!)
// rotation = 0 Rotate0 0 degrees, 1 Rotate90 90 degrees, 
// 2 Rotate180 180 degrees, 3 Rotate270 270 degrees (equivalent to -90)
// boxSpace = Inner space of the box where the placement occurs [x,y] - default is Box 190x130 inner space

module Place(x=0, y=0, elementSpace=[0,0], 
  alignX=AlignLeft, alignY=AlignBottom, 
  rotation=NoRotation, boxSpace=getBox190Space()) {

    module Position(x, y, space, rotation=Rotate0) {
        translate([x, y, 0])
            RotateFix(space, rotation)
                children();
    }

    space = getRotatedSpace(elementSpace, rotation);
    alignedX = getAlignedX(space.x, boxSpace.x, alignX, x);
    alignedY = getAlignedY(space.y, boxSpace.y, alignY, y);
    Position(alignedX, alignedY, elementSpace, rotation)
        children();
}

// Center(space=getBox130Space(), elementSpace=[0,0])
// space = Space where the children is centered. For cylinder use centered=true and no elementSpace.
// elementSpace = space of the element to be centered [x,y]

module Center(space=getBox190Space(), elementSpace=[0,0]) {
    translate([(space.x - elementSpace.x) / 2, (space.y - elementSpace.y) / 2])
        children(0);
}

// CenterHorizontal(width=0, y=0, offset=0, space=getBox130Space())
// space = Space where the children is centered. For cylinder use centered=true and no elementSpace.
// elementSpace = space of the element to be centered [x,y]

module CenterHorizontal(width=0, y=0, offset=0, space=getBox190Space()) {
    translate([(space.x - width) / 2 + offset, y])
        children(0);
}

// CenterVertical(depth=0, x=0, offset=0, space=getBox130Space())
// space = Space where the children is centered. For cylinder use centered=true and no elementSpace.
// elementSpace = space of the element to be centered [x,y]

module CenterVertical(depth=0, x=0, offset=0, space=getBox190Space()) {
    translate([x, (space.y - depth) / 2 + offset])
        children(0);
}
// file: ../../Elements/AxisClip10.scad
// Fischertechnik Box Library
// Axis for clip 10
// 31023

use <../ModelBase/Simple.scad>
use <../Base/Constants.scad>

/* [Element Parameters] */
height = 23;
clipHeight = 10;

/* [Hidden] */
width = 12;
depth = 12;
upperDiameter = 3.6;

// getAxisClip10Space()
// Gets the space of a frame for a clip 10 with spring ring (mot2)

function getAxisClip10Space() = [width, depth, height];

// AxisClip10(height, clipHeight)
// Axis for clip 10 with spring ring (mot2)
// height = Height of the complete axis
// clipHeight = Height of the part for the clip (standard is 10, in mot3 its only 7)

module AxisClip10(height=height, clipHeight=clipHeight) {
    LeveledAxisWithSpace(height, height-clipHeight, getAxisClip10Space(), diameter=upperDiameter);
}

// Test
color("lightgray")
AxisClip10(height, clipHeight);
// file: ../../Base/Constants.scad
// Fischertechnik Box Foundation
// Constants

// Constant values necessary for multiple elements

// Base constants
dividerThickness = 1.2;
excess = 0.01;
fragments = 90;
tolerance = 0.8;

// Gets the thickness of a divider 
function getDividerThickness() = dividerThickness;

// Gets the excess that is used to merge walls into each other
function getExcess() = excess;

// Gets amount of fragments of a cylinder
function getFragments() = fragments;

// Gets the inner tolerance of a frame to each side
function getTolerance() = tolerance;


// Fischertechnik specific constants
axisDiameter = 4;
axisBottomDiameter = axisDiameter + 1;
axisTolerance = 0.2;
axisLockingLength = 8;

// Gets axis diameter of Fischertechnik axis
function getAxisDiameter() = axisDiameter;

// Gets axis diameter tolerance (subtracted for element axis)
function getAxisTolerance() = axisTolerance;

// Gets the axis diameter for standing axis
function getStandAxisDiameter() = getAxisDiameter() - getAxisTolerance();

// Gets axis bottom diameter for thicker part at the bottom
function getAxisBottomDiameter() = axisBottomDiameter;

// Gets the lengthh of the locking part of a locking axis
function getAxisLockingLength() = axisLockingLength;

// Studs

studHeight = 2.5;
studTolerance = 0.2;
studRailDistance = 9;   // as in ft 50

// gets the height of a connecting stud
function getStudHeight() = studHeight;

// gets the connecting stud height tolerance
function getStudTolerance() = studTolerance;

// gets the default rail distance for studs
function getStudRailDistance() = studRailDistance;

// Dockable Frame with Edge

standardEdgeDistance = 2.5;
standardWebDistance = 11.5;
standardCornerLength = 15;

// gets the standard distance to the wall of the box for dockable frames with webs
function getStandardEdgeDistance() = standardEdgeDistance;

// gets the standard distance of each web to the corner of the dockable frame
function getStandardWebDistance() = standardWebDistance;

// gets the standard length of the corner walls of a dockable frame
function getStandardCornerLength() = standardCornerLength;

// Tubes

tubeWallFactor = 0.8;

// gets the wall thickness of a tube.
function getTubeWallThickness() = tubeWallFactor * getDividerThickness();

// Small Parts and Divider Frame

smallPartsFrameHeight = 20;

// gets the frame height for docked small parts boxes.
function getSmallPartsFrameHeight() = smallPartsFrameHeight;

// Hubs

hubRingDiameter = 19.5;
hubRingLevelDiameter = 21;

// gets the diameter of a tube matching the inner ring of a wheel
function getHubRingDiameter() = hubRingDiameter;

// gets the diameter of a hub tube with a thicker diameter
function getHubRingLevelDiameter() = hubRingLevelDiameter;

// Struts

strutAddLength = 9.0;
strutDepth = 8.0;
strutThickness = 2.8;
strutOuterTolerance = 0.6;

// gets the full length of a strut (nominal length plus 2x radius at the ends)
function getFullStrutLength(length) = length + strutAddLength;

// gets the radius of the end of a strut
function getStrutEndRadius() = strutAddLength / 2;

// gets the the depth (width) of a strut
function getStrutDepth() = strutDepth;

// gets the the thickness of a strut
function getStrutThickness() = strutThickness;

// gets the tolerance added to the strut sizes for strut holders
function getStrutOuterTolerance() = strutOuterTolerance;

// Propeller

propellerAxisDiameter = 7.0;
propellerAxisTolerance = 0.2;

// gets the propeller axis outer diameter
function getPropellerAxisDiameter() = propellerAxisDiameter;

// gets the propeller axis printing tolerance
function getPropellerAxisTolerance() = propellerAxisTolerance;
// file: ../../Elements/CylinderAndAxisSegmentDisc.scad
// Fischertechnik Box Library
// Cylinder with two axis and a web for a segment disc
// 31037

use <../Base/Constants.scad>
use <../Base/Placement.scad>
use <../ModelBase/Simple.scad>
use <../ModelBase/Complex.scad>

use <CylinderGearZ20.scad>

width = 52;
depth = 52;

function getCylinderAndAxisSegmentDiscSpace() = [width, depth];

// CylinderAndAxisSegmentDisc
// Cylinder with two axis and a web for a segment disc

module CylinderAndAxisSegmentDisc() {
    Space(getCylinderAndAxisSegmentDiscSpace());

    xOffset = 2.8;
    yOffset = (getCylinderAndAxisSegmentDiscSpace().y - getCylinderGearZ20Space().y)/2;

    axisHeight = getCylinderGearZ20Height();

    translate([xOffset, yOffset, 0]) {
        CylinderGearZ20();

        centerDistance = 17.5;
        diameter = getAxisDiameter() - 0.4;

        Center(space=getCylinderGearZ20Space()) { 
            translate([sin(150)*centerDistance, cos(150)*centerDistance])           
                Axis(axisHeight, diameter=diameter);
            translate([sin(30)*centerDistance, cos(30)*centerDistance])           
                Axis(axisHeight, diameter=diameter);
        }
    }

    webHeight = 9.3;
    webOffset = 40;
    webDepth = 34.8;
    webVolume = [getDividerThickness(), webDepth, webHeight];

    CenterVertical(depth=webDepth, x=webOffset, space=getCylinderAndAxisSegmentDiscSpace())
        Wall(webVolume);
}

// Test
color("lightgray")
CylinderAndAxisSegmentDisc();
// file: ../TestPrint.scad
// 3D Print Test Base

use <../Base/Constants.scad>

use <../Elements/AxisClip10.scad>

module TestPrint(elementSpace) {
    cube([elementSpace.x, elementSpace.y, 0.4]);
    translate([0,0,0.4+getExcess()]) {
        children();
    }
}

TestPrint(getAxisClip10Space())
    AxisClip10();
// main file
// 3D Print Test
// CylinderAndAxisSegmentDisc

use <../TestPrint.scad>
use <../../Elements/CylinderAndAxisSegmentDisc.scad>

TestPrint(getCylinderAndAxisSegmentDiscSpace())
    CylinderAndAxisSegmentDisc();
